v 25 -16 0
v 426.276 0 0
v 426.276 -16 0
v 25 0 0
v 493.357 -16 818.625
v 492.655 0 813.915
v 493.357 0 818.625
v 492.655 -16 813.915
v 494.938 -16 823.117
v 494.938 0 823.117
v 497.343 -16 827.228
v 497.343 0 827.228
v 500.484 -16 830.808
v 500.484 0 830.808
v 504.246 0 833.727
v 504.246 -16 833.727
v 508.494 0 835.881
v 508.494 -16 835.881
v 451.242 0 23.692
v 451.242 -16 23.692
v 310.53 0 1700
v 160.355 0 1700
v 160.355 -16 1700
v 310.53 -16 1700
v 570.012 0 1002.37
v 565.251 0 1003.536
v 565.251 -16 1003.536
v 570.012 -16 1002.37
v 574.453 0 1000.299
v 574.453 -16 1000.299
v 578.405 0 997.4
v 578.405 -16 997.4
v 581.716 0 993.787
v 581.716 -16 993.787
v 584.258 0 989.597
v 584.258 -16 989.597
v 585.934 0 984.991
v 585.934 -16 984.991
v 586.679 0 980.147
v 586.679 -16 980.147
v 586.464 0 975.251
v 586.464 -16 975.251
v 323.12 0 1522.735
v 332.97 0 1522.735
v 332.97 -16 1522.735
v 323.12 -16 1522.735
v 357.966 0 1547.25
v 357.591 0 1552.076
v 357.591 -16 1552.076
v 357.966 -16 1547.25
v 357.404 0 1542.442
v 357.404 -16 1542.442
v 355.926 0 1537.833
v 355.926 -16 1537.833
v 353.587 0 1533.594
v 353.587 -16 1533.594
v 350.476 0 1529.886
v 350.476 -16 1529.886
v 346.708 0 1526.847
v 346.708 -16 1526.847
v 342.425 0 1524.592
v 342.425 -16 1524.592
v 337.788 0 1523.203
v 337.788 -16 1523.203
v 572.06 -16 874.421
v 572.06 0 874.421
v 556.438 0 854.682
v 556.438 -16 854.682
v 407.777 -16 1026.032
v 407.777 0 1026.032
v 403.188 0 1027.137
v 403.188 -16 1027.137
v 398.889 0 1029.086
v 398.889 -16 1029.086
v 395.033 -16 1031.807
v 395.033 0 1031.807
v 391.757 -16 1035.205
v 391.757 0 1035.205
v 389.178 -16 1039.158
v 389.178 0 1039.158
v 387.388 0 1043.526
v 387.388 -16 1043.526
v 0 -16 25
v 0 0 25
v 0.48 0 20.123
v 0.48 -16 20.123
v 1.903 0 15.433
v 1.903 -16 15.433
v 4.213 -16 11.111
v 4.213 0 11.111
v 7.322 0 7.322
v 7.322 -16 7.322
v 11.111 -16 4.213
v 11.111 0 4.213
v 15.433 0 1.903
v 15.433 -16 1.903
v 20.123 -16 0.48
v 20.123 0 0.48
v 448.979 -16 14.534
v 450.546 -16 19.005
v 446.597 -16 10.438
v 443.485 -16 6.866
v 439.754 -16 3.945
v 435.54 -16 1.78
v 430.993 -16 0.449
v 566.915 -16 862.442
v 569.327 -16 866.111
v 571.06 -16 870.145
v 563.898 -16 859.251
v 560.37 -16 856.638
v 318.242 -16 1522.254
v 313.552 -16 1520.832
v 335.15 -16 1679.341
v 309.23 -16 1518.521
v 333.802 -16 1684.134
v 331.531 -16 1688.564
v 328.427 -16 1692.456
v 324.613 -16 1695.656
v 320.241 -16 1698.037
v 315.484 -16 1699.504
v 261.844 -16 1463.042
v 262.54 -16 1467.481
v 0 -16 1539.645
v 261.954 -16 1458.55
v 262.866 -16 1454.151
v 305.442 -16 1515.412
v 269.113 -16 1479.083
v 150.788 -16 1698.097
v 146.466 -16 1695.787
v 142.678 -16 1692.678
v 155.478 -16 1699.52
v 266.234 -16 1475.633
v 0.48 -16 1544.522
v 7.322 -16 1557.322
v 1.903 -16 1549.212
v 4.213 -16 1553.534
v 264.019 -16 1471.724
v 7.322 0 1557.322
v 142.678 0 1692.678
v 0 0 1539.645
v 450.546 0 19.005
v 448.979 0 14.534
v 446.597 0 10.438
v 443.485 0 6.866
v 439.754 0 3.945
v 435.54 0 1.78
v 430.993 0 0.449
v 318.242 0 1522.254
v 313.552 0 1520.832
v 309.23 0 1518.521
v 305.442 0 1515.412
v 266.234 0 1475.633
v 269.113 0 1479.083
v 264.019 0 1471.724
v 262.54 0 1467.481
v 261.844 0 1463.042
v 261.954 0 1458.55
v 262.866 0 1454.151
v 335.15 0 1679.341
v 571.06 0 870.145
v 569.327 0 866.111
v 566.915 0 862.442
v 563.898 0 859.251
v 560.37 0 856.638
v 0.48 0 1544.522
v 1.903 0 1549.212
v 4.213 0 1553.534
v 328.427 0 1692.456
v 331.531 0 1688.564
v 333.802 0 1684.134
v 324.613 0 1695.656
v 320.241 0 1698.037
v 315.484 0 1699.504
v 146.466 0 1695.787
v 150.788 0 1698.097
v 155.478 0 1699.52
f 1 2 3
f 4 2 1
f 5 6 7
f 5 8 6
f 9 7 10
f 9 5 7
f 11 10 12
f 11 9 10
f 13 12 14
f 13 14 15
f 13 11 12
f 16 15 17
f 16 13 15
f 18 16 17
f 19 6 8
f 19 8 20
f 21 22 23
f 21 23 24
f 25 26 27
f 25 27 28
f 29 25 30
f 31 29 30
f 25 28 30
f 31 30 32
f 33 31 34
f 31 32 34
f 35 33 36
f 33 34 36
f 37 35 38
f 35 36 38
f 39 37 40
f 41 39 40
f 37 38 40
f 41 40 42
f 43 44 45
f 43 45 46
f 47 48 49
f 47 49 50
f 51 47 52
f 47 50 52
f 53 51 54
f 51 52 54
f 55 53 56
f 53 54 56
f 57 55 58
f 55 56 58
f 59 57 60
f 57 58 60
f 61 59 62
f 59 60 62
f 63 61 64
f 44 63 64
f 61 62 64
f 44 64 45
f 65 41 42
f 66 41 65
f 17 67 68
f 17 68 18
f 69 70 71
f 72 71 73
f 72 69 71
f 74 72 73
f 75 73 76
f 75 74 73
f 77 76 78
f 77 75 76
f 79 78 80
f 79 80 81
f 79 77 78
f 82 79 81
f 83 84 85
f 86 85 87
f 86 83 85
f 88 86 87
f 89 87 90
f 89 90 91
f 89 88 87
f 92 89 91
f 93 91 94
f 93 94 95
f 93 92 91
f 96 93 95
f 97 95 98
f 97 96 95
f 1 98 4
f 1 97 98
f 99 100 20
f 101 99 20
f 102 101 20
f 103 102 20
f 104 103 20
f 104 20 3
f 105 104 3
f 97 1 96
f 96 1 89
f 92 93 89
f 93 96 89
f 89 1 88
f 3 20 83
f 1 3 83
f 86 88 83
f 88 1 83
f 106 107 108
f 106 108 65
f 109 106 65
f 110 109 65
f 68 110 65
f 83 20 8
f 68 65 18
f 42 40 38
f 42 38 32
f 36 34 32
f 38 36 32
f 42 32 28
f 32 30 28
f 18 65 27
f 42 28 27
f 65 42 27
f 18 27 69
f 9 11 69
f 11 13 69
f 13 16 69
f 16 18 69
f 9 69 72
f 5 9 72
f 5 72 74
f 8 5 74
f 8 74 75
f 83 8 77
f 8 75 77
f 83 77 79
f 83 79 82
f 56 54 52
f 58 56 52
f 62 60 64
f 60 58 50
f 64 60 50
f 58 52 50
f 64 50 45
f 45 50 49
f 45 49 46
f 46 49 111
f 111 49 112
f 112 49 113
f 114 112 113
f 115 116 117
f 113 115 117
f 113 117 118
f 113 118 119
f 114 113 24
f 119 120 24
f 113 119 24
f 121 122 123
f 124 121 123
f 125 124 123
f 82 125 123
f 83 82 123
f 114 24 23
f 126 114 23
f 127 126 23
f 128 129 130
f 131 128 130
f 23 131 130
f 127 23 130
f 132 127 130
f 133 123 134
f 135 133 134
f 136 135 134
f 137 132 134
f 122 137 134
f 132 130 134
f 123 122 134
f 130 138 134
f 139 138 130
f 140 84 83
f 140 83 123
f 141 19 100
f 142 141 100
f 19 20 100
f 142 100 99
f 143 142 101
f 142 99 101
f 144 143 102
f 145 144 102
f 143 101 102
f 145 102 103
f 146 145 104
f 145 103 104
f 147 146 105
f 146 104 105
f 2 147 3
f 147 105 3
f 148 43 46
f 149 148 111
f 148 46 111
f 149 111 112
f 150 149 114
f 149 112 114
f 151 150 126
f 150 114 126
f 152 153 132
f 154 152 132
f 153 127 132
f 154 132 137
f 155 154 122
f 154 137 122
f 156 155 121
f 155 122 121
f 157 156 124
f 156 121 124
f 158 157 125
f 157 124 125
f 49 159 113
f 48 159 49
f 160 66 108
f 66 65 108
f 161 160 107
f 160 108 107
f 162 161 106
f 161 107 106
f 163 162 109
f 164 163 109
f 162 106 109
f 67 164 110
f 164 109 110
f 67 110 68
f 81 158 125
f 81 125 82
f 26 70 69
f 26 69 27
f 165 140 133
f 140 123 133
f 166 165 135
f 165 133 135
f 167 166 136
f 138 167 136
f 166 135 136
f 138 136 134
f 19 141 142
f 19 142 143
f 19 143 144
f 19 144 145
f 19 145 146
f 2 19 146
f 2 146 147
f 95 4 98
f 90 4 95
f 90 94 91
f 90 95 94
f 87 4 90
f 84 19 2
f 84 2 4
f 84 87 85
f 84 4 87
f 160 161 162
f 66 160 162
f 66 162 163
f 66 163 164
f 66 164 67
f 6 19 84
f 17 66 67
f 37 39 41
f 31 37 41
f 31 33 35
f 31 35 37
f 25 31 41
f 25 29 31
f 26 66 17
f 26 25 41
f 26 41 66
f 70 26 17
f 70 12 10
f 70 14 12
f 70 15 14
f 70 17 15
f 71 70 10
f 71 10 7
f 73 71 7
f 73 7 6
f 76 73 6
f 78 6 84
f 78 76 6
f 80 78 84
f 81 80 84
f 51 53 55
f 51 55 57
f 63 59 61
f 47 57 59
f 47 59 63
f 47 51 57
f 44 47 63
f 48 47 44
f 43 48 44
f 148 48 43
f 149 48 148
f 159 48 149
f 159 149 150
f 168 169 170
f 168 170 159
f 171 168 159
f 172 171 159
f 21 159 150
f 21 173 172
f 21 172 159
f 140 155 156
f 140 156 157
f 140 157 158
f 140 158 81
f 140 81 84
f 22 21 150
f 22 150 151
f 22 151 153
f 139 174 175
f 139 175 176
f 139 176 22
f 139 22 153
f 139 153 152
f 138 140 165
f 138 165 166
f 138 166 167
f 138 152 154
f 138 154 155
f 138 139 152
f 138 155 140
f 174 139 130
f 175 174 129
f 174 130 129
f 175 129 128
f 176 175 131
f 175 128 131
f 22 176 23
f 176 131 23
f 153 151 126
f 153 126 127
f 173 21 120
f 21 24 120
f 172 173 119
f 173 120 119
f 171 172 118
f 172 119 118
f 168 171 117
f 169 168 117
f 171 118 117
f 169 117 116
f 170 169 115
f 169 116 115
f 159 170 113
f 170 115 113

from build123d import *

# Parameters (mm, degrees)
PAD_DEPTH   = 16
FILLET_R    = 25
FILLET001_R = 25


with BuildPart() as part:
    # Sketch → Pad (new body)
    with BuildSketch(Plane.XZ):
        Polygon((0, 0), (0, 1550), (150, 1700), (331.507568, 1700), (362.76424, 1522.734604), (312.76424, 1522.734604), (258.518351, 1468.488715), (392.010101, 1028.284271), (590, 1000), (570, 860), (493.498457, 830), (450, 0), align=None)
    extrude(amount=PAD_DEPTH)

    # Fillet
    fillet_edges = [part.edges().sort_by_distance(p)[0] for p in [
        (362.76424, -8, 1522.734604),
        (331.507568, -8, 1700),
        (150, -8, 1700),
        (0, -8, 1550),
        (0, -8, 0),
        (450, -8, 0),
        (590, -8, 1000),
        (570, -8, 860),
    ]]
    fillet(fillet_edges, radius=FILLET_R)

    # Fillet001
    fillet001_edges = [part.edges().sort_by_distance(p)[0] for p in [
        (493.498457, -8, 830),
        (392.010101, -8, 1028.284271),
        (258.518351, -8, 1468.488715),
        (312.76424, -8, 1522.734604),
    ]]
    fillet(fillet001_edges, radius=FILLET001_R)


solid = part.part
